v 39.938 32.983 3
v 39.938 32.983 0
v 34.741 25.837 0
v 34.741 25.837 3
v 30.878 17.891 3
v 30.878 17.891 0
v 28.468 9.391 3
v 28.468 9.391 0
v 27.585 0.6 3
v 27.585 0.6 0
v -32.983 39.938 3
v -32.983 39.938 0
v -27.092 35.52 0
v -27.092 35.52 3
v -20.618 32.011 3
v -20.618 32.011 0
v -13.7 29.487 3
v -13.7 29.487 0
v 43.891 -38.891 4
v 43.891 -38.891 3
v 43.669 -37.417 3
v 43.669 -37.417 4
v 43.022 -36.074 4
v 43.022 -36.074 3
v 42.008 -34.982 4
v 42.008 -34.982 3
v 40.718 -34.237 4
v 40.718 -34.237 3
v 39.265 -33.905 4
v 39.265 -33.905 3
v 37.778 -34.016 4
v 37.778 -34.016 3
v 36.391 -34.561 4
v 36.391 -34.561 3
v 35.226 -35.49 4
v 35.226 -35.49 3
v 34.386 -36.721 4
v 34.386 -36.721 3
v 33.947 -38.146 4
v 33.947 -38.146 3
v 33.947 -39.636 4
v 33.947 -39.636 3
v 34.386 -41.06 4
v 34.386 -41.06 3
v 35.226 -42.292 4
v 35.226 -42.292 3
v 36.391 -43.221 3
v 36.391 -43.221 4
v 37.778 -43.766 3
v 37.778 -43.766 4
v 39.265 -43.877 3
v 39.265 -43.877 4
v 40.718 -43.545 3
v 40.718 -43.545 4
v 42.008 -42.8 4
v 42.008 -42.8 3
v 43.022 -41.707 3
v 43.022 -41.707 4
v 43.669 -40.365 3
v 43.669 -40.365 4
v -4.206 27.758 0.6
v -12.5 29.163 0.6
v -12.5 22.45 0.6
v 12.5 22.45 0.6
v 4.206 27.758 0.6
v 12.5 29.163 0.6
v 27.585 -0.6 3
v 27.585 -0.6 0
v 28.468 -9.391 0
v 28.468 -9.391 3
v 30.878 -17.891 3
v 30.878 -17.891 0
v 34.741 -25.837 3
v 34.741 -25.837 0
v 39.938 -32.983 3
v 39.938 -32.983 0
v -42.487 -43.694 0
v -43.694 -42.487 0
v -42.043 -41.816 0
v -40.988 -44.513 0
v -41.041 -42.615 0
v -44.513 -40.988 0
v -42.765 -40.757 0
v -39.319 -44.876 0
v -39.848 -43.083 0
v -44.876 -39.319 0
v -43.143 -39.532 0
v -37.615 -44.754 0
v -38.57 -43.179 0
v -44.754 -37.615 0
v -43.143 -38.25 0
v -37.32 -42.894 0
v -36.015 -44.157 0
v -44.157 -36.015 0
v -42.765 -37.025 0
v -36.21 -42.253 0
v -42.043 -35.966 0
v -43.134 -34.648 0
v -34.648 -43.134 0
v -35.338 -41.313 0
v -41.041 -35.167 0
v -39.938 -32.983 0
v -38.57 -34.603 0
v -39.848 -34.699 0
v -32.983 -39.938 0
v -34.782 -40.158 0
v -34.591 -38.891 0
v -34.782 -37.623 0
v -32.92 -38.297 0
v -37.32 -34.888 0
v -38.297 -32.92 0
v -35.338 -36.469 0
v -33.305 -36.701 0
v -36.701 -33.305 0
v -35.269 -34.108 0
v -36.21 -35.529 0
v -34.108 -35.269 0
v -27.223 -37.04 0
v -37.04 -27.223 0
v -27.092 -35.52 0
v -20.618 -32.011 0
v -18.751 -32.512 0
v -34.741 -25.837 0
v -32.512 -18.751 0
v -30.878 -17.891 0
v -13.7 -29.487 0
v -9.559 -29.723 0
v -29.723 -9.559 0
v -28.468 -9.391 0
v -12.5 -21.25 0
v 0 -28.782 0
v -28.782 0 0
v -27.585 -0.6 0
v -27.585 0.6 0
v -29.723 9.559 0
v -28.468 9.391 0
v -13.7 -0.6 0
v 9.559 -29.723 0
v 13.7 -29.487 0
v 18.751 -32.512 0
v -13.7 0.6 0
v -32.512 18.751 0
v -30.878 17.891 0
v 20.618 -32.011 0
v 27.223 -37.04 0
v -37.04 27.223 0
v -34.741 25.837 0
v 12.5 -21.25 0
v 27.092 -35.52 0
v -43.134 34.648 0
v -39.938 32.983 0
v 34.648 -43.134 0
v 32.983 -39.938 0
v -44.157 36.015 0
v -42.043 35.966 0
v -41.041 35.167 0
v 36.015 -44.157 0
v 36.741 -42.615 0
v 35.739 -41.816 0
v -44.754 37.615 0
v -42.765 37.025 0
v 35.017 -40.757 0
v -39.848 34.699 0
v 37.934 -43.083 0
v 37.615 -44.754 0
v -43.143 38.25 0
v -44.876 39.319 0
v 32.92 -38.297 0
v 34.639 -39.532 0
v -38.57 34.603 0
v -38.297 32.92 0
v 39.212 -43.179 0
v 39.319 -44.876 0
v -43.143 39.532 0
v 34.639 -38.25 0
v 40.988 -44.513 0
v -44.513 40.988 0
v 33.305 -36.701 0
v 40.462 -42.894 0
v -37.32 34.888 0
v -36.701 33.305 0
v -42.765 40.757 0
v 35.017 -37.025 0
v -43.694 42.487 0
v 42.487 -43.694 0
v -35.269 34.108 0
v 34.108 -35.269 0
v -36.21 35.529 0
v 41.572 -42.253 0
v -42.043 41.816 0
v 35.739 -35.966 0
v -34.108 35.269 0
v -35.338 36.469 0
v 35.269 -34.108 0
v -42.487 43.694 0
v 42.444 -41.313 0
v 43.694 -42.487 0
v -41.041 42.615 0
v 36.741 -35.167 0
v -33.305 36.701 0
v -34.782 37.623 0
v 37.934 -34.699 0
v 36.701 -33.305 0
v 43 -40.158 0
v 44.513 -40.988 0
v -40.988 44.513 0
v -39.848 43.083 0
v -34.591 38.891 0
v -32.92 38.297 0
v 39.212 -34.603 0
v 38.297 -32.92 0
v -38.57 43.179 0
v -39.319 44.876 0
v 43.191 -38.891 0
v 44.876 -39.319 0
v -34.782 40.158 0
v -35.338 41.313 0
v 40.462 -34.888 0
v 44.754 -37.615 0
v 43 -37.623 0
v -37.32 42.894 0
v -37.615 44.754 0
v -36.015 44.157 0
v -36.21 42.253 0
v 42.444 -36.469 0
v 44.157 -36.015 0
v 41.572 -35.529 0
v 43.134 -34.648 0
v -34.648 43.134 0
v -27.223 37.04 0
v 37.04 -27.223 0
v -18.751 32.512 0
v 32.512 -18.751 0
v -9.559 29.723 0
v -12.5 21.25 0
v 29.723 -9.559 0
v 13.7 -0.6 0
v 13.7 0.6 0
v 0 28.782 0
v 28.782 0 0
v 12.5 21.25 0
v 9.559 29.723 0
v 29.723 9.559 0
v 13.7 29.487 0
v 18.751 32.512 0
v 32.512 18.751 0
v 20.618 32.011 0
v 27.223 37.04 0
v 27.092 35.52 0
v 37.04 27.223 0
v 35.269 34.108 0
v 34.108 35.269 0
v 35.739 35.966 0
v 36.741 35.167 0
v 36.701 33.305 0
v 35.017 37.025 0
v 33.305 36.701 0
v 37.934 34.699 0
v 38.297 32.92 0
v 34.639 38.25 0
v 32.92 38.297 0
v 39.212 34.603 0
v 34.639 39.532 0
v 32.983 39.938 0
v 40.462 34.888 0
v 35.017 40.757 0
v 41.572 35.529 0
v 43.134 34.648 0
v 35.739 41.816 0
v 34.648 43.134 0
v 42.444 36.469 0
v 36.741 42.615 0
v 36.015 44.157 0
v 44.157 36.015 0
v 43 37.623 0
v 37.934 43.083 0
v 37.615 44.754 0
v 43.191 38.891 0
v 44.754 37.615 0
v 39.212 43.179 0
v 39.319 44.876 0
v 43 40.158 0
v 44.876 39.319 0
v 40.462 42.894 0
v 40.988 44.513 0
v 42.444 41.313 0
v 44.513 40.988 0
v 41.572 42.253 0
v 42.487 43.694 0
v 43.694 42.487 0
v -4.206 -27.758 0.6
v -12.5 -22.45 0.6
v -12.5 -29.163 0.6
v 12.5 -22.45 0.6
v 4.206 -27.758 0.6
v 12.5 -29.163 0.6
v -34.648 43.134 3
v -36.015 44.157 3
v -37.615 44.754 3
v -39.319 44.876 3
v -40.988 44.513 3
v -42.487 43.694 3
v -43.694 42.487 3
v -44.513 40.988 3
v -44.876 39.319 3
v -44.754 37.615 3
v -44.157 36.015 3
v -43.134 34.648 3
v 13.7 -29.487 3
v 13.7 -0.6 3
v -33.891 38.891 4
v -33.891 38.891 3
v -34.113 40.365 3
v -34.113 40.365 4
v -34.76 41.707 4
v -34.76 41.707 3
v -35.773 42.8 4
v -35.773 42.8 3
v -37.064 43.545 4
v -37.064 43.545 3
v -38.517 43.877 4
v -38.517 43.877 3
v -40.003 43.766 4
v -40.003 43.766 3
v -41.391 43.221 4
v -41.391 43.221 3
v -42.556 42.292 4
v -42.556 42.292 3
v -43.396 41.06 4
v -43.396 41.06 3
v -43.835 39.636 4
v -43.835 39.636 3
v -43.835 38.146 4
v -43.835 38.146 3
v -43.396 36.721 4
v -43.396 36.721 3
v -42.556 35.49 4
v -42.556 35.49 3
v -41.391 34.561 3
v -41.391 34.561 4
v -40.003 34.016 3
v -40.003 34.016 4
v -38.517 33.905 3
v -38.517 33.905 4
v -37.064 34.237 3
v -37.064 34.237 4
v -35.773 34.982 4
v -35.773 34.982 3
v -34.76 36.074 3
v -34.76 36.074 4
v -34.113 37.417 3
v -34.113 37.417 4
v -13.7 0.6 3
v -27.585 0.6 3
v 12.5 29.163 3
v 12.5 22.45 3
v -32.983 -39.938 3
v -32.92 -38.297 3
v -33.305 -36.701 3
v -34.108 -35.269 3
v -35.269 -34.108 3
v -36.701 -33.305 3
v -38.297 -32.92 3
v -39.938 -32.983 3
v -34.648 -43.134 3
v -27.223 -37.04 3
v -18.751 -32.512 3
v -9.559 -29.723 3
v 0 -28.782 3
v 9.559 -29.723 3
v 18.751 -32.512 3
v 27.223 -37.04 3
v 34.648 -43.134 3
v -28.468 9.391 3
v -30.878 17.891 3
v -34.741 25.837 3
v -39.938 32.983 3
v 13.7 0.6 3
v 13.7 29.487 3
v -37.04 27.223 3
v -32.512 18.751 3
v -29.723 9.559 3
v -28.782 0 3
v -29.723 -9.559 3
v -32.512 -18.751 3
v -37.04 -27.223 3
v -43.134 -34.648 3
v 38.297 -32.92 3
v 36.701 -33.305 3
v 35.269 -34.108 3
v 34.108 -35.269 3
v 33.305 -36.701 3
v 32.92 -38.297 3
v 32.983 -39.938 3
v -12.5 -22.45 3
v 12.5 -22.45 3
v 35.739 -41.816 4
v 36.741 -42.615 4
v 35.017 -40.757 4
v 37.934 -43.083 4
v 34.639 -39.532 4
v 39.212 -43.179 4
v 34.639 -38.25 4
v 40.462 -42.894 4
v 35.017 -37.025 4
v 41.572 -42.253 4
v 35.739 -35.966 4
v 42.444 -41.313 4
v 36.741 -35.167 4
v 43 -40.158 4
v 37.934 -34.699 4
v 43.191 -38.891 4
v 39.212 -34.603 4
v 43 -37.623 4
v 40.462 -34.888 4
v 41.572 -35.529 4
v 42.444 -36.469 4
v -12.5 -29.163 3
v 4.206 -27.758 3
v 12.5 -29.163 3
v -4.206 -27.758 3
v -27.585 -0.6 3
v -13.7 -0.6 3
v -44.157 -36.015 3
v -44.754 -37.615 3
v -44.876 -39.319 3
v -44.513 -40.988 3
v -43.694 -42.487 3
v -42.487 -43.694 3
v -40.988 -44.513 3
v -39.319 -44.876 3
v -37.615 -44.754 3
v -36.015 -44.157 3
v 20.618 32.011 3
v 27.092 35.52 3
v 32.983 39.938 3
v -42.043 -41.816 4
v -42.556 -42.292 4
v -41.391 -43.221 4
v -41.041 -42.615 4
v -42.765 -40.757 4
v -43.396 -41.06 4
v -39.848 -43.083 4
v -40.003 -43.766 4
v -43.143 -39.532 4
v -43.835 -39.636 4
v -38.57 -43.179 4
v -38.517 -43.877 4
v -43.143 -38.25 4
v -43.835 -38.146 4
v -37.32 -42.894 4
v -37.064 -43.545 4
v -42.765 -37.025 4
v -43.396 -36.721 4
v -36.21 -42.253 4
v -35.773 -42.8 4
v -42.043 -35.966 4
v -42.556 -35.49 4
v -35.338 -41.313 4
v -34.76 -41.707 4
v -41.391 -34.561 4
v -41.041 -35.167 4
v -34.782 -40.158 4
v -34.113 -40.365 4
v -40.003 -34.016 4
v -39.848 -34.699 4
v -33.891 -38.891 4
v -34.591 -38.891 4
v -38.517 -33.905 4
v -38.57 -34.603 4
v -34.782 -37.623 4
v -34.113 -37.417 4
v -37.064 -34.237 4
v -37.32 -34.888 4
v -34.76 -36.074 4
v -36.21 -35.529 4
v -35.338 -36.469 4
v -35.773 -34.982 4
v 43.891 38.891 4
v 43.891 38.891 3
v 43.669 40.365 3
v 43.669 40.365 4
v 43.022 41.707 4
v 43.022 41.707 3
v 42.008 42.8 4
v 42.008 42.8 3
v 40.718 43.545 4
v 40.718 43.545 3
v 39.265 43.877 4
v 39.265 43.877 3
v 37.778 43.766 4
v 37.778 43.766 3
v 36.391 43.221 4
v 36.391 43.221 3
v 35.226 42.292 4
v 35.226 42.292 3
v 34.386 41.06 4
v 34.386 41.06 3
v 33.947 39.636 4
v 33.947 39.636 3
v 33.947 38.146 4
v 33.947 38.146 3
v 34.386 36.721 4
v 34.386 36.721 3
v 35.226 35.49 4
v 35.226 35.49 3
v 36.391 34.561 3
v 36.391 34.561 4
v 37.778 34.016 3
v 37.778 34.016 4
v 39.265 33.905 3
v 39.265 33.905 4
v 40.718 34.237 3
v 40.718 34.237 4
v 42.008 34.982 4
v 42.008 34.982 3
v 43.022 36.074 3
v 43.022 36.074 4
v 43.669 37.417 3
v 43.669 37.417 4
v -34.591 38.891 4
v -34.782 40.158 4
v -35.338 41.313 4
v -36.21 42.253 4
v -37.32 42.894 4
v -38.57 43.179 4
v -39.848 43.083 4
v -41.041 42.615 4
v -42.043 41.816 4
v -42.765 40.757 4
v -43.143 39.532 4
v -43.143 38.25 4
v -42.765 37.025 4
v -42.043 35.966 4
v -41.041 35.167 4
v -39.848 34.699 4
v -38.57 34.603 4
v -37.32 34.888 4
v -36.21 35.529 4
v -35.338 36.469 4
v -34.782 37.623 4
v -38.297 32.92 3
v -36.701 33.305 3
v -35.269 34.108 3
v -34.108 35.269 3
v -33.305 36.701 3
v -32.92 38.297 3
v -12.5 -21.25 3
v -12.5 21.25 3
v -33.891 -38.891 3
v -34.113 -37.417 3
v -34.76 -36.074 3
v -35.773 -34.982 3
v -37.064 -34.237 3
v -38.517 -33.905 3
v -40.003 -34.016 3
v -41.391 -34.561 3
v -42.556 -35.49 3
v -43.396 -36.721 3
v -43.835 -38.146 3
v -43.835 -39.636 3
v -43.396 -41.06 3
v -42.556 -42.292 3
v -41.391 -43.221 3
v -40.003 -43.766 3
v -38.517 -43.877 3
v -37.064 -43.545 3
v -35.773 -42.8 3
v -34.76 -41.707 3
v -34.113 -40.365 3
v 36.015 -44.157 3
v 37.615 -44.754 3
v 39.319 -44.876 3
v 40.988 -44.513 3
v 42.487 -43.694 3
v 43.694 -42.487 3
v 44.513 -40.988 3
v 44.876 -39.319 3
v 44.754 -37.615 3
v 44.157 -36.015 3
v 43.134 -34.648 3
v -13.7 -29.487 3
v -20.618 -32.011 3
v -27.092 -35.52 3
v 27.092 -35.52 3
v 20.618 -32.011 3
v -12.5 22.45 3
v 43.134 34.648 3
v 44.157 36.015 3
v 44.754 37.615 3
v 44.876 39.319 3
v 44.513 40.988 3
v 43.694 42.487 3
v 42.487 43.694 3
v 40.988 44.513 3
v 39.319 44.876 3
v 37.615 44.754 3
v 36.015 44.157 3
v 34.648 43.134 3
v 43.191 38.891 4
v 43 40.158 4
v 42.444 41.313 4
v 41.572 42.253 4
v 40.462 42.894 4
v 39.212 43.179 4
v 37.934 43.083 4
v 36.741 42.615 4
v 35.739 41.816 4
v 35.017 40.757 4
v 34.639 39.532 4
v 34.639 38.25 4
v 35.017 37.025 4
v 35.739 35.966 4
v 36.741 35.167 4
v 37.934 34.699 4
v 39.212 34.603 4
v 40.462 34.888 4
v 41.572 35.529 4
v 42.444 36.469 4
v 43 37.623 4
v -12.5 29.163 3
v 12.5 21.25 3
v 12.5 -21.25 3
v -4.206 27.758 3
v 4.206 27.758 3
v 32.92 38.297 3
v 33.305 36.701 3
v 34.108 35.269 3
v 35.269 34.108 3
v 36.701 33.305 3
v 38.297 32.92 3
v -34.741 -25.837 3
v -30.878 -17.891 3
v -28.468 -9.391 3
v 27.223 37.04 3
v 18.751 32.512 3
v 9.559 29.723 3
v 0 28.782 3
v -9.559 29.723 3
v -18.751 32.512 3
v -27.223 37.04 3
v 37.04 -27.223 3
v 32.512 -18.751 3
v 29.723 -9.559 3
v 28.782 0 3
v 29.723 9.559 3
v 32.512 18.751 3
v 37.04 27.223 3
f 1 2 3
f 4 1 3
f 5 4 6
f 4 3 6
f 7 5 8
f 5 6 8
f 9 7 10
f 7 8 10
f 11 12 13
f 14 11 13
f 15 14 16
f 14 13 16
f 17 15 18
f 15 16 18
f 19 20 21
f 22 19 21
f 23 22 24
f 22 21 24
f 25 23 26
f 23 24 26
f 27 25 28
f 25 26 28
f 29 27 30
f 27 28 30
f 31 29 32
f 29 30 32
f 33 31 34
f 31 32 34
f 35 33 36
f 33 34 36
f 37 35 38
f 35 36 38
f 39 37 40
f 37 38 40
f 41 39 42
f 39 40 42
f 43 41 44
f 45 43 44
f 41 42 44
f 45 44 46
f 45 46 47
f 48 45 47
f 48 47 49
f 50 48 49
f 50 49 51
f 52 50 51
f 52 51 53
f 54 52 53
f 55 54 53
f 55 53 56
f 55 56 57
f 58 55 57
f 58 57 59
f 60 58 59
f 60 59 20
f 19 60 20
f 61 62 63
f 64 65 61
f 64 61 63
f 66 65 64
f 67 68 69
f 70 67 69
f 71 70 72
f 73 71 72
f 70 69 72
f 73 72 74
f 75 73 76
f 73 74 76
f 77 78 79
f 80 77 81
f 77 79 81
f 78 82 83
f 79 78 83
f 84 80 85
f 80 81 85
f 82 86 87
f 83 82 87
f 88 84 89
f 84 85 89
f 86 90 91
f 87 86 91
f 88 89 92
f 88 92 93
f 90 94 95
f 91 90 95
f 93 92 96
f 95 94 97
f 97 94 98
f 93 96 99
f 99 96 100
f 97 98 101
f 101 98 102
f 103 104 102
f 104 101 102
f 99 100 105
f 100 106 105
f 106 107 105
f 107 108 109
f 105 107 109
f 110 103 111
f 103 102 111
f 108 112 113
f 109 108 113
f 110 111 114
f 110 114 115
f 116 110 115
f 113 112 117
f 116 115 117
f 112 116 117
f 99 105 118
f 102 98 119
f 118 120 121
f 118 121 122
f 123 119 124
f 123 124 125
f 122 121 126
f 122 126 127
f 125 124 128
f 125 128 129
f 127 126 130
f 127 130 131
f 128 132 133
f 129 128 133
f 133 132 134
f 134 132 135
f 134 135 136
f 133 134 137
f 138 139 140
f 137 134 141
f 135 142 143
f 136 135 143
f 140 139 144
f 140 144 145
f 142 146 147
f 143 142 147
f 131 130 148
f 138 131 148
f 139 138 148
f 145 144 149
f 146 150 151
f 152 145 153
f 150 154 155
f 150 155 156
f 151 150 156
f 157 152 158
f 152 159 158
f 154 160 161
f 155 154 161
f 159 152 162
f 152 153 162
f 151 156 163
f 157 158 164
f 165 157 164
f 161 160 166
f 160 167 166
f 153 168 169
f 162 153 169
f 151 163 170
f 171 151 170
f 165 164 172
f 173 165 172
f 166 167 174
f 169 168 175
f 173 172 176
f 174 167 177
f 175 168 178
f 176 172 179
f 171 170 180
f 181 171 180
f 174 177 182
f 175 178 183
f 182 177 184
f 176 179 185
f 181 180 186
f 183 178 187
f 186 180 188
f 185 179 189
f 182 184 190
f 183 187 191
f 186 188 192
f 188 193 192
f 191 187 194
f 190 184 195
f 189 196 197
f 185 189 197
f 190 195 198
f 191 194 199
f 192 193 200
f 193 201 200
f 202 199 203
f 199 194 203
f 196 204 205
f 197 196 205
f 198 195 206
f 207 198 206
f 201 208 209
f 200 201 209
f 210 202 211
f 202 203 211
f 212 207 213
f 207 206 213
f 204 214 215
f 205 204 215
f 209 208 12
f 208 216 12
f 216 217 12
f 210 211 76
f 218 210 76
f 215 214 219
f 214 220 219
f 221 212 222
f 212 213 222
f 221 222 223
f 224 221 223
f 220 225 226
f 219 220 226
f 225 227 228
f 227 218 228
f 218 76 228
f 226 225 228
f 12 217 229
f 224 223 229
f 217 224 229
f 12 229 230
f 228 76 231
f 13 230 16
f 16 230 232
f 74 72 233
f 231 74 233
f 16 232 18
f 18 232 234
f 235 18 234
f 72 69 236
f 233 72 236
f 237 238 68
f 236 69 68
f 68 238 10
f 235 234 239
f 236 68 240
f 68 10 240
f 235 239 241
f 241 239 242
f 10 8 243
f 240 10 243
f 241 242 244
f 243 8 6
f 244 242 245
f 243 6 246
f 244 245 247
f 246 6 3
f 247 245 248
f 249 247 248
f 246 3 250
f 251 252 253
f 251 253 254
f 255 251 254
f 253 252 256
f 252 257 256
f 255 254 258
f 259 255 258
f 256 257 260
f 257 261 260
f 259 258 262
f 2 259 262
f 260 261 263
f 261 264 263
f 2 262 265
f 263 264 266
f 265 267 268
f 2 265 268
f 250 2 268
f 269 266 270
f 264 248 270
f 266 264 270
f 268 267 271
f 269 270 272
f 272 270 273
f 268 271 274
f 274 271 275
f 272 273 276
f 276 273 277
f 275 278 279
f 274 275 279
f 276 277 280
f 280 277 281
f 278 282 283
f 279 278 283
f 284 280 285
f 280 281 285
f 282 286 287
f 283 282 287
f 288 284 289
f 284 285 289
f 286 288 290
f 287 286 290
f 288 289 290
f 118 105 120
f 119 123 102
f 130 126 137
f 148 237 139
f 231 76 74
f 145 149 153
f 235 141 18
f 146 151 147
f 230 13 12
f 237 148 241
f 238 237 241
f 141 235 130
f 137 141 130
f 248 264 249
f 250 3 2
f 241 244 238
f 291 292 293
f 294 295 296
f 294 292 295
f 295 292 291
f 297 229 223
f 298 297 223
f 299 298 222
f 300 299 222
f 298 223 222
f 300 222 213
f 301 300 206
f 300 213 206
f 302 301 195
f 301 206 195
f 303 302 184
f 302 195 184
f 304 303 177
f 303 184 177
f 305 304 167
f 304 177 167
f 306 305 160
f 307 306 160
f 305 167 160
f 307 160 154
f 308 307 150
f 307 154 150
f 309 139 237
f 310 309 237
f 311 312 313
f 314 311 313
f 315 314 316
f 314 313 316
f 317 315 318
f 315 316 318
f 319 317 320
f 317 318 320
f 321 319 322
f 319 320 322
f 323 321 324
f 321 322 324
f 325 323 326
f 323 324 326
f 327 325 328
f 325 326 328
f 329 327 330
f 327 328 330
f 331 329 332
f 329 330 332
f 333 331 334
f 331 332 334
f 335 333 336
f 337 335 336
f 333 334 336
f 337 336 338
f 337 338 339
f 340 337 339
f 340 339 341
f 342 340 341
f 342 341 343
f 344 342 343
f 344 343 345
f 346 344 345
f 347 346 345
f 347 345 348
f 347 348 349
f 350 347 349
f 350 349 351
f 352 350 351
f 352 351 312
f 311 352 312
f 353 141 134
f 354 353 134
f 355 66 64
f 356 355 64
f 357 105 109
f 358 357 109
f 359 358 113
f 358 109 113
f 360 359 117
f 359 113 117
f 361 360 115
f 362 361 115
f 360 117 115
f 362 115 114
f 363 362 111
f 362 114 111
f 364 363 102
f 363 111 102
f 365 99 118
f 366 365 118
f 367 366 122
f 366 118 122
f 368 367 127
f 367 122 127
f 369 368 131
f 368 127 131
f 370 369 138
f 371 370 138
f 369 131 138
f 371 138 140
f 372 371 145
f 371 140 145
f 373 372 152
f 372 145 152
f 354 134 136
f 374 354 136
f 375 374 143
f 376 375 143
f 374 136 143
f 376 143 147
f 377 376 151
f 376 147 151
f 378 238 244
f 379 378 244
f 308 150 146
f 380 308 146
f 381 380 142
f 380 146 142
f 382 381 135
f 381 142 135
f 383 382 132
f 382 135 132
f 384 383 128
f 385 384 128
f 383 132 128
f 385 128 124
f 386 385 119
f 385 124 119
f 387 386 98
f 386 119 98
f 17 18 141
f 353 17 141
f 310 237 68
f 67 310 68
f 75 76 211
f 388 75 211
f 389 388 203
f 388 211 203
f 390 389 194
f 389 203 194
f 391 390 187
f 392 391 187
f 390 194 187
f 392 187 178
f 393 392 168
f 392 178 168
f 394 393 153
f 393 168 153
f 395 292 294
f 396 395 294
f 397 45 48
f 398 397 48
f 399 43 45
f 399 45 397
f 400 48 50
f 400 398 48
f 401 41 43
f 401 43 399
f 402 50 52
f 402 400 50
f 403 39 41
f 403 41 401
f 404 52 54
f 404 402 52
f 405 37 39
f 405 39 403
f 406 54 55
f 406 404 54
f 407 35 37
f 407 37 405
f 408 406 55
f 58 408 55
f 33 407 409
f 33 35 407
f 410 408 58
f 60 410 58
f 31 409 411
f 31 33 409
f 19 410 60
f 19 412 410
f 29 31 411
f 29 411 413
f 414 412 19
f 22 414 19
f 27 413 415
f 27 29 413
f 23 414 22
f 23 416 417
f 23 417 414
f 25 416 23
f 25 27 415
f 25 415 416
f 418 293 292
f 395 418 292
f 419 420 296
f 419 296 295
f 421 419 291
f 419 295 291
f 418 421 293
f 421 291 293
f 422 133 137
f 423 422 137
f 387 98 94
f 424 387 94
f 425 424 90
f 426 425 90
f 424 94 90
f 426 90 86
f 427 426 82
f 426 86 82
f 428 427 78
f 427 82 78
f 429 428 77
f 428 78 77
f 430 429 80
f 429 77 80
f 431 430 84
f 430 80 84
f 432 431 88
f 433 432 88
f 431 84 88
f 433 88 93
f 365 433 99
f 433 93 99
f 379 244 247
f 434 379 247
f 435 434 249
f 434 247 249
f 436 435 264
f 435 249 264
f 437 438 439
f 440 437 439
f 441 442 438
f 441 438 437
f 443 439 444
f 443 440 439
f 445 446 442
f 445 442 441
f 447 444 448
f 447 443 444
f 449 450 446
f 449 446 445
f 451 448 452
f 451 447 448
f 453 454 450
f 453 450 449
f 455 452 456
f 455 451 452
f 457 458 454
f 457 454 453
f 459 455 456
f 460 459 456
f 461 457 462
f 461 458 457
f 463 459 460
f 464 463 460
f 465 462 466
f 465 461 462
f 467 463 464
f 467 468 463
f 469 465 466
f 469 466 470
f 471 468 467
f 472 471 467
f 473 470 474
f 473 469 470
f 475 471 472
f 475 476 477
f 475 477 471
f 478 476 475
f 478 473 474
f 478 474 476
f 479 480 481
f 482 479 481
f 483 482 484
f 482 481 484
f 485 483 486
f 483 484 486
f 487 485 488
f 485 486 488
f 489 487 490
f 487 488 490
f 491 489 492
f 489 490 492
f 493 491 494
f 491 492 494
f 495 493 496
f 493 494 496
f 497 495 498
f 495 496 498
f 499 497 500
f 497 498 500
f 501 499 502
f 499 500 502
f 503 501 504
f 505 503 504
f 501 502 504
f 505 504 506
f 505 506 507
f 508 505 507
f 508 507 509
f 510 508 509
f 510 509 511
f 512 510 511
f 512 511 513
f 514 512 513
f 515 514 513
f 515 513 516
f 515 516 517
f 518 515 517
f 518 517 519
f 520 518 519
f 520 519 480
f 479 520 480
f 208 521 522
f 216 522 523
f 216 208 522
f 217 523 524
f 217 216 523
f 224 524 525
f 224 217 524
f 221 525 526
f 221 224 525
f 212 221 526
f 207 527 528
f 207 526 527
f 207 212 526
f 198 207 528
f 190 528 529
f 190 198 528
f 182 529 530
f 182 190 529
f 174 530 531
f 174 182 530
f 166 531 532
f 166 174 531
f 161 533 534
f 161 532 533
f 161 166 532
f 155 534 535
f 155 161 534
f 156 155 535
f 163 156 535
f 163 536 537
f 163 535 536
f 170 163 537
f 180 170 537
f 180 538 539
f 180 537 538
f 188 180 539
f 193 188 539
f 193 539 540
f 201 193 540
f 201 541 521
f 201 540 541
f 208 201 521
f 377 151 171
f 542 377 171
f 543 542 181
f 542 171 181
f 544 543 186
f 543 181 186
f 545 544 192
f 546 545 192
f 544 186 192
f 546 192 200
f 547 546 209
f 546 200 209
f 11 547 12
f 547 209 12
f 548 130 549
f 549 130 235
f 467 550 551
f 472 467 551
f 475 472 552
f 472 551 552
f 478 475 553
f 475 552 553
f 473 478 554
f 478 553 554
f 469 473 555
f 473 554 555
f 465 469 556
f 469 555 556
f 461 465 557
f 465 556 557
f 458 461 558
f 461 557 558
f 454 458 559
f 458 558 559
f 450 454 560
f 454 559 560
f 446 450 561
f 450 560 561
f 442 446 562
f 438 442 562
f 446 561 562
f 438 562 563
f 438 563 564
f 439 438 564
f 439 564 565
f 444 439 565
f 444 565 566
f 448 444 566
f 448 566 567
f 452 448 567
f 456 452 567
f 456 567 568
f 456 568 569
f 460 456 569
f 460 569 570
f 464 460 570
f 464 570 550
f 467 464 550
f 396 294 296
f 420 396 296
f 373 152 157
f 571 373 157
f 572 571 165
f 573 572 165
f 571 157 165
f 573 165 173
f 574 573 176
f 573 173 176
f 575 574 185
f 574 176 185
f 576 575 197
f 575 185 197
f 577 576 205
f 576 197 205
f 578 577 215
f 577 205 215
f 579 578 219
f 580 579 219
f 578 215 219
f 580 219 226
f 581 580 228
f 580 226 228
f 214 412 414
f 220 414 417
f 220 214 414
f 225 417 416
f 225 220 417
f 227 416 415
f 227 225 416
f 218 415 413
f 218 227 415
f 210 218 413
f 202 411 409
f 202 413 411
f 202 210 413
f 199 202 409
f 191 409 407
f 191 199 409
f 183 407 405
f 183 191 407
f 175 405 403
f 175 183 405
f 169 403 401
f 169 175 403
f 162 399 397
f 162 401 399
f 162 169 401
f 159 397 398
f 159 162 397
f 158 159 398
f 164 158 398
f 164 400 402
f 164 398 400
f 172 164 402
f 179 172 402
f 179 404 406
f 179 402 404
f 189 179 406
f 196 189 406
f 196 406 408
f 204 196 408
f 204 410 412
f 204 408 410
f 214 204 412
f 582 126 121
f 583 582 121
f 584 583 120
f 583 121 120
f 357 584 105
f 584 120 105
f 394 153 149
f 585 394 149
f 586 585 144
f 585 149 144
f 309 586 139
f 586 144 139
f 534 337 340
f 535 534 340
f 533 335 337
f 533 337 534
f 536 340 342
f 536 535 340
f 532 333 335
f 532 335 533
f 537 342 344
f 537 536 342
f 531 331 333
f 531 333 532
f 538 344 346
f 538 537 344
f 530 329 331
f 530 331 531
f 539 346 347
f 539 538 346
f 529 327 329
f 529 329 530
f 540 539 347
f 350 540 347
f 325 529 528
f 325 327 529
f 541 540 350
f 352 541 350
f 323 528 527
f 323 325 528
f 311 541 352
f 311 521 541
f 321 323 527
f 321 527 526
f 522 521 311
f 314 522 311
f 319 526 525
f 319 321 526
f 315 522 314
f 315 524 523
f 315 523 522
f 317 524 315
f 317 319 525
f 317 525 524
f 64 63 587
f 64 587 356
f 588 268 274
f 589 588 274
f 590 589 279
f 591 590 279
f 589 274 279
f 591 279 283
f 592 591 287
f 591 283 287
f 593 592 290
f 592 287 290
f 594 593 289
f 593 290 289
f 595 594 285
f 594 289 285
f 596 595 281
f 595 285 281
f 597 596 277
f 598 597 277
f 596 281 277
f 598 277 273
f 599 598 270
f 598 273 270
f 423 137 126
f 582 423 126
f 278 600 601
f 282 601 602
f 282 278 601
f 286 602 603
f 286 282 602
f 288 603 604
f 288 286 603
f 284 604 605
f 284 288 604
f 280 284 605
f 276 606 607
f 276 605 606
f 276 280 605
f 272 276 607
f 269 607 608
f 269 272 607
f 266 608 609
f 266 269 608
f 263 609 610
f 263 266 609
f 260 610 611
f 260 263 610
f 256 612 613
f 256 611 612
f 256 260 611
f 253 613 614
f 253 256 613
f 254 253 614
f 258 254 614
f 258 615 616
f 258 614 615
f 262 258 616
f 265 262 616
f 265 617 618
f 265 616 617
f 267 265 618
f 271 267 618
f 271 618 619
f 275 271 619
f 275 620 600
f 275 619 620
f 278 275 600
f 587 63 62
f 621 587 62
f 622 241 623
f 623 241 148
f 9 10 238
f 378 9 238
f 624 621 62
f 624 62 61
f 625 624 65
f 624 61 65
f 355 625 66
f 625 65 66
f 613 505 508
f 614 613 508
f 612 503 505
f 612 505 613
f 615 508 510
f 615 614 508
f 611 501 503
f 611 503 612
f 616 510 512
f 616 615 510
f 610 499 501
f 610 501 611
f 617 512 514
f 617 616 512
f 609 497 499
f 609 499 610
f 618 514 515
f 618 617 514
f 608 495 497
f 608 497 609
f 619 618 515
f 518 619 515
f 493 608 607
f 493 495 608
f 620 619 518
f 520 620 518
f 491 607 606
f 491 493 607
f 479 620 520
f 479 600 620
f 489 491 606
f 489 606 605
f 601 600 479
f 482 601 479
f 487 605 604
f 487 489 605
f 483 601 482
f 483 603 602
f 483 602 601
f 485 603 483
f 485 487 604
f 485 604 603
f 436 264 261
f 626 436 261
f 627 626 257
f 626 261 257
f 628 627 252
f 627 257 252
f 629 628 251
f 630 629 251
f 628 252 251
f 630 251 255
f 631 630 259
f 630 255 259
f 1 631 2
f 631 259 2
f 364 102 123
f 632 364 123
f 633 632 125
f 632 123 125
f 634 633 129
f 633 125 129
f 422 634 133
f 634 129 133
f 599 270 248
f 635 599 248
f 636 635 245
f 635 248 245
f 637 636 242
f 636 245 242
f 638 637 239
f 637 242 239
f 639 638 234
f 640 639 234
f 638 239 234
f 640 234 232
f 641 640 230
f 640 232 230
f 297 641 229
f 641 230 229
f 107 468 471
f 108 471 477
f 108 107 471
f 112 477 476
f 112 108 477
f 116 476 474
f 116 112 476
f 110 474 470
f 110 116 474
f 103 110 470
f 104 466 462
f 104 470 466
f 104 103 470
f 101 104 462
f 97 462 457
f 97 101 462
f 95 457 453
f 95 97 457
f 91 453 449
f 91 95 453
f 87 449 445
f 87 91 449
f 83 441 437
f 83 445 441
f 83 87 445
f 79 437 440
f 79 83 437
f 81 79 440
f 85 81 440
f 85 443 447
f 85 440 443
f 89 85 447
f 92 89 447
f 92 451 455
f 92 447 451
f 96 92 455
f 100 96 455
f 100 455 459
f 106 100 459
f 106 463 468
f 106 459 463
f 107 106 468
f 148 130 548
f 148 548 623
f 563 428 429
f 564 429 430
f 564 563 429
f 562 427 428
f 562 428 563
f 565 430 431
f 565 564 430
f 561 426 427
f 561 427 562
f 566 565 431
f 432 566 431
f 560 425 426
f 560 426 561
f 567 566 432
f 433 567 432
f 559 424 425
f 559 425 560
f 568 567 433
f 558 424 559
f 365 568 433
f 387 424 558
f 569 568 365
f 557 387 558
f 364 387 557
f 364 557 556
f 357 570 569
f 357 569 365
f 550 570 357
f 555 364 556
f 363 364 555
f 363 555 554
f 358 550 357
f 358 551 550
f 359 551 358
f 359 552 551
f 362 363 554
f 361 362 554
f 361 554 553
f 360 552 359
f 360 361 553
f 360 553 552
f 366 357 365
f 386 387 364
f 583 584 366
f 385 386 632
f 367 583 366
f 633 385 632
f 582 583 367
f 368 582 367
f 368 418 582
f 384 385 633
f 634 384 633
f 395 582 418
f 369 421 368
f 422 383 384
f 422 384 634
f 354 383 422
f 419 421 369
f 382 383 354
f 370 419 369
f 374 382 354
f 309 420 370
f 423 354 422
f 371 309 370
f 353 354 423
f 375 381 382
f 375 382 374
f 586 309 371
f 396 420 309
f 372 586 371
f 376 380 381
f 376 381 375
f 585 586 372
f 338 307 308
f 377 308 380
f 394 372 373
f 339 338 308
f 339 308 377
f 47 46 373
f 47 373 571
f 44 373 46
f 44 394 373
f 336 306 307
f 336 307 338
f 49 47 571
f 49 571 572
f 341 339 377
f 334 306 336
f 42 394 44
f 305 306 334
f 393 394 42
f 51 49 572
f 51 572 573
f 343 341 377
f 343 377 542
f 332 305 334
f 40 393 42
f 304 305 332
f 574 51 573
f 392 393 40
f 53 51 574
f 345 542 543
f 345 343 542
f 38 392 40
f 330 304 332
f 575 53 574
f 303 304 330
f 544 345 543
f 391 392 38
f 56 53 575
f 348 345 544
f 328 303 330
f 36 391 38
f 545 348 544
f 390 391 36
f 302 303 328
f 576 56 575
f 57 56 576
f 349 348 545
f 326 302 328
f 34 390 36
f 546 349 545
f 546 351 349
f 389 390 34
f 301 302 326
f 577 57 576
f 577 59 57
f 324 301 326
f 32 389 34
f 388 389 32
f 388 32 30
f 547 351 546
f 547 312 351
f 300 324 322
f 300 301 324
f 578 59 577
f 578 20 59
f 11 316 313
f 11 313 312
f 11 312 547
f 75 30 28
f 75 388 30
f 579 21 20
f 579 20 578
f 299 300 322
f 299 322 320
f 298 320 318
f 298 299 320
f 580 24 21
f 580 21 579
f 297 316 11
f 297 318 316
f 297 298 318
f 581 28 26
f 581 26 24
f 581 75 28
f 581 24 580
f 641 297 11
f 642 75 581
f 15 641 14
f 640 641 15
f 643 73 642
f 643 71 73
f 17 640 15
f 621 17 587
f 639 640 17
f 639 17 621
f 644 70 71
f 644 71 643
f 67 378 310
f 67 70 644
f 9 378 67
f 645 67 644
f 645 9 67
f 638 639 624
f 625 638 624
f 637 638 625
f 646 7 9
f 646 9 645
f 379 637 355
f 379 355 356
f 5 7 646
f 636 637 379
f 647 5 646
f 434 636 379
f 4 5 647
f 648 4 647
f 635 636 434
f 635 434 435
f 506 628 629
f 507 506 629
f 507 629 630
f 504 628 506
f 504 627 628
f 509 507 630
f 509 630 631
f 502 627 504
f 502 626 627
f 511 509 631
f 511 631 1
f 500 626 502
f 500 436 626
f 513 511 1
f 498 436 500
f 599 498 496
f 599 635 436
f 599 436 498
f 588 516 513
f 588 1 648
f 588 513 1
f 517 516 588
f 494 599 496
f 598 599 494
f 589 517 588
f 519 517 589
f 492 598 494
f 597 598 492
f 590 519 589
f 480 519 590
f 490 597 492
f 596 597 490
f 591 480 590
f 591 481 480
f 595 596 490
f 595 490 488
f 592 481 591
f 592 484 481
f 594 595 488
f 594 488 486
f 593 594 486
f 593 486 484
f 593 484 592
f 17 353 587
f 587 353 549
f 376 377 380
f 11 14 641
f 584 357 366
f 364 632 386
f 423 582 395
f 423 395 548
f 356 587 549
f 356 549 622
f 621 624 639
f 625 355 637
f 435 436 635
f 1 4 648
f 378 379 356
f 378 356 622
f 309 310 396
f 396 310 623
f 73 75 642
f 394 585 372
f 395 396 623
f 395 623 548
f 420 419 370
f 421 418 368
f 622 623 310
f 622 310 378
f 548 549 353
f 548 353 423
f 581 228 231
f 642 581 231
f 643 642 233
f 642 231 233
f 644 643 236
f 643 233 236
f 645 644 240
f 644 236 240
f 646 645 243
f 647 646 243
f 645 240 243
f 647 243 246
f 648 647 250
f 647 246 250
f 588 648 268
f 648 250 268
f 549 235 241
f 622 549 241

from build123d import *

# Parameters (mm, degrees)
F4_DEPTH = 3
F3_R     = 5
F5_DEPTH = 4
F2_W     = 25
F2_H     = 1.2
F7_DEPTH = 3
F8_DEPTH = 0.6
F6_R     = 4.3
F9_DEPTH = 4.001


with BuildPart() as f4:
    # F1 (on Top) → F4 (new body)
    with BuildSketch(Plane.XY):
        with BuildLine():
            ThreePointArc((-34.648232, 43.133514), (-43.133514, 43.133514), (-43.133514, 34.648232))
            ThreePointArc((-43.133514, 34.648232), (-28.781746, 0), (-43.133514, -34.648232))
            ThreePointArc((-43.133514, -34.648232), (-43.133514, -43.133514), (-34.648232, -43.133514))
            ThreePointArc((-34.648232, -43.133514), (0, -28.781746), (34.648232, -43.133514))
            ThreePointArc((34.648232, -43.133514), (43.133514, -43.133514), (43.133514, -34.648232))
            ThreePointArc((43.133514, -34.648232), (28.781746, 0), (43.133514, 34.648232))
            ThreePointArc((43.133514, 34.648232), (43.133514, 43.133514), (34.648232, 43.133514))
            ThreePointArc((34.648232, 43.133514), (0, 28.781746), (-34.648232, 43.133514))
        make_face()
        with BuildLine():
            ThreePointArc((-32.982909, 39.937754), (0, 27.581746), (32.982909, 39.937754))
            ThreePointArc((32.982909, 39.937754), (34.648232, 34.648232), (39.937754, 32.982909))
            ThreePointArc((39.937754, 32.982909), (27.581746, 0), (39.937754, -32.982909))
            ThreePointArc((39.937754, -32.982909), (34.648232, -34.648232), (32.982909, -39.937754))
            ThreePointArc((32.982909, -39.937754), (0, -27.581746), (-32.982909, -39.937754))
            ThreePointArc((-32.982909, -39.937754), (-34.648232, -34.648232), (-39.937754, -32.982909))
            ThreePointArc((-39.937754, -32.982909), (-27.581746, 0), (-39.937754, 32.982909))
            ThreePointArc((-39.937754, 32.982909), (-34.648232, 34.648232), (-32.982909, 39.937754))
        make_face(mode=Mode.SUBTRACT)
    extrude(amount=F4_DEPTH)

    # F3 (on Top) → F5 (join)
    with BuildSketch(Plane.XY):
        with Locations((-38.890873, 38.890873)):
            Circle(F3_R)
        with Locations((38.890873, 38.890873)):
            Circle(F3_R)
        with Locations((-38.890873, -38.890873)):
            Circle(F3_R)
        with Locations((38.890873, -38.890873)):
            Circle(F3_R)
    extrude(amount=F5_DEPTH)

    # F2 (on Top) → F7 (join, through all)
    with BuildSketch(Plane.XY):
        with BuildLine():
            Line((-12.5, 22.45), (-12.5, 29.162922))
            ThreePointArc((-12.5, 29.162922), (-13.101004, 29.321415), (-13.7, 29.487336))
            Line((-13.7, 29.487336), (-13.7, 23.25))
            Line((-13.7, 23.25), (-13.7, 21.25))
            Line((-13.7, 21.25), (-13.7, 0.6))
            Line((-13.7, 0.6), (-13.7, -0.6))
            Line((-13.7, -0.6), (-13.7, -21.25))
            Line((-13.7, -21.25), (-13.7, -23.25))
            Line((-13.7, -23.25), (-13.7, -29.487336))
            ThreePointArc((-13.7, -29.487336), (-13.101004, -29.321415), (-12.5, -29.162922))
            Line((-12.5, -29.162922), (-12.5, -22.45))
            Line((-12.5, -22.45), (-12.5, -21.25))
            Line((-12.5, -21.25), (-12.5, 21.25))
            Line((-12.5, 21.25), (-12.5, 22.45))
        make_face()
        with BuildLine():
            ThreePointArc((13.7, 29.487336), (13.101004, 29.321415), (12.5, 29.162922))
            Line((12.5, 29.162922), (12.5, 22.45))
            Line((12.5, 22.45), (12.5, 21.25))
            Line((12.5, 21.25), (12.5, -21.25))
            Line((12.5, -21.25), (12.5, -22.45))
            Line((12.5, -22.45), (12.5, -29.162922))
            ThreePointArc((12.5, -29.162922), (13.101004, -29.321415), (13.7, -29.487336))
            Line((13.7, -29.487336), (13.7, -23.25))
            Line((13.7, -23.25), (13.7, -21.25))
            Line((13.7, -21.25), (13.7, -0.6))
            Line((13.7, -0.6), (13.7, 0.6))
            Line((13.7, 0.6), (13.7, 21.25))
            Line((13.7, 21.25), (13.7, 23.25))
            Line((13.7, 23.25), (13.7, 29.487336))
        make_face()
        with Locations((0, 21.85)):
            Rectangle(F2_W, F2_H)
        with Locations((0, -21.85)):
            Rectangle(F2_W, F2_H)
        with BuildLine():
            Line((-13.7, -0.6), (-13.7, 0.6))
            Line((-13.7, 0.6), (-27.585332, 0.6))
            ThreePointArc((-27.585332, 0.6), (-27.581746, 0), (-27.585332, -0.6))
            Line((-27.585332, -0.6), (-13.7, -0.6))
        make_face()
        with BuildLine():
            Line((27.585332, 0.6), (13.7, 0.6))
            Line((13.7, 0.6), (13.7, -0.6))
            Line((13.7, -0.6), (27.585332, -0.6))
            ThreePointArc((27.585332, -0.6), (27.581746, 0), (27.585332, 0.6))
        make_face()
    extrude(amount=F7_DEPTH)

    # F2 (on Top) → F8 (join)
    with BuildSketch(Plane.XY):
        with BuildLine():
            ThreePointArc((12.5, 29.162922), (0, 27.581746), (-12.5, 29.162922))
            Line((-12.5, 29.162922), (-12.5, 22.45))
            Line((-12.5, 22.45), (12.5, 22.45))
            Line((12.5, 22.45), (12.5, 29.162922))
        make_face()
        with BuildLine():
            Line((12.5, -22.45), (-12.5, -22.45))
            Line((-12.5, -22.45), (-12.5, -29.162922))
            ThreePointArc((-12.5, -29.162922), (0, -27.581746), (12.5, -29.162922))
            Line((12.5, -29.162922), (12.5, -22.45))
        make_face()
    extrude(amount=F8_DEPTH)

    # F6 (on Top) → F9 (cut, through all)
    with BuildSketch(Plane.XY):
        with Locations((-38.890873, 38.890873)):
            Circle(F6_R)
        with Locations((38.890873, 38.890873)):
            Circle(F6_R)
        with Locations((-38.890873, -38.890873)):
            Circle(F6_R)
        with Locations((38.890873, -38.890873)):
            Circle(F6_R)
    extrude(amount=F9_DEPTH, mode=Mode.SUBTRACT)


solid = f4.part
